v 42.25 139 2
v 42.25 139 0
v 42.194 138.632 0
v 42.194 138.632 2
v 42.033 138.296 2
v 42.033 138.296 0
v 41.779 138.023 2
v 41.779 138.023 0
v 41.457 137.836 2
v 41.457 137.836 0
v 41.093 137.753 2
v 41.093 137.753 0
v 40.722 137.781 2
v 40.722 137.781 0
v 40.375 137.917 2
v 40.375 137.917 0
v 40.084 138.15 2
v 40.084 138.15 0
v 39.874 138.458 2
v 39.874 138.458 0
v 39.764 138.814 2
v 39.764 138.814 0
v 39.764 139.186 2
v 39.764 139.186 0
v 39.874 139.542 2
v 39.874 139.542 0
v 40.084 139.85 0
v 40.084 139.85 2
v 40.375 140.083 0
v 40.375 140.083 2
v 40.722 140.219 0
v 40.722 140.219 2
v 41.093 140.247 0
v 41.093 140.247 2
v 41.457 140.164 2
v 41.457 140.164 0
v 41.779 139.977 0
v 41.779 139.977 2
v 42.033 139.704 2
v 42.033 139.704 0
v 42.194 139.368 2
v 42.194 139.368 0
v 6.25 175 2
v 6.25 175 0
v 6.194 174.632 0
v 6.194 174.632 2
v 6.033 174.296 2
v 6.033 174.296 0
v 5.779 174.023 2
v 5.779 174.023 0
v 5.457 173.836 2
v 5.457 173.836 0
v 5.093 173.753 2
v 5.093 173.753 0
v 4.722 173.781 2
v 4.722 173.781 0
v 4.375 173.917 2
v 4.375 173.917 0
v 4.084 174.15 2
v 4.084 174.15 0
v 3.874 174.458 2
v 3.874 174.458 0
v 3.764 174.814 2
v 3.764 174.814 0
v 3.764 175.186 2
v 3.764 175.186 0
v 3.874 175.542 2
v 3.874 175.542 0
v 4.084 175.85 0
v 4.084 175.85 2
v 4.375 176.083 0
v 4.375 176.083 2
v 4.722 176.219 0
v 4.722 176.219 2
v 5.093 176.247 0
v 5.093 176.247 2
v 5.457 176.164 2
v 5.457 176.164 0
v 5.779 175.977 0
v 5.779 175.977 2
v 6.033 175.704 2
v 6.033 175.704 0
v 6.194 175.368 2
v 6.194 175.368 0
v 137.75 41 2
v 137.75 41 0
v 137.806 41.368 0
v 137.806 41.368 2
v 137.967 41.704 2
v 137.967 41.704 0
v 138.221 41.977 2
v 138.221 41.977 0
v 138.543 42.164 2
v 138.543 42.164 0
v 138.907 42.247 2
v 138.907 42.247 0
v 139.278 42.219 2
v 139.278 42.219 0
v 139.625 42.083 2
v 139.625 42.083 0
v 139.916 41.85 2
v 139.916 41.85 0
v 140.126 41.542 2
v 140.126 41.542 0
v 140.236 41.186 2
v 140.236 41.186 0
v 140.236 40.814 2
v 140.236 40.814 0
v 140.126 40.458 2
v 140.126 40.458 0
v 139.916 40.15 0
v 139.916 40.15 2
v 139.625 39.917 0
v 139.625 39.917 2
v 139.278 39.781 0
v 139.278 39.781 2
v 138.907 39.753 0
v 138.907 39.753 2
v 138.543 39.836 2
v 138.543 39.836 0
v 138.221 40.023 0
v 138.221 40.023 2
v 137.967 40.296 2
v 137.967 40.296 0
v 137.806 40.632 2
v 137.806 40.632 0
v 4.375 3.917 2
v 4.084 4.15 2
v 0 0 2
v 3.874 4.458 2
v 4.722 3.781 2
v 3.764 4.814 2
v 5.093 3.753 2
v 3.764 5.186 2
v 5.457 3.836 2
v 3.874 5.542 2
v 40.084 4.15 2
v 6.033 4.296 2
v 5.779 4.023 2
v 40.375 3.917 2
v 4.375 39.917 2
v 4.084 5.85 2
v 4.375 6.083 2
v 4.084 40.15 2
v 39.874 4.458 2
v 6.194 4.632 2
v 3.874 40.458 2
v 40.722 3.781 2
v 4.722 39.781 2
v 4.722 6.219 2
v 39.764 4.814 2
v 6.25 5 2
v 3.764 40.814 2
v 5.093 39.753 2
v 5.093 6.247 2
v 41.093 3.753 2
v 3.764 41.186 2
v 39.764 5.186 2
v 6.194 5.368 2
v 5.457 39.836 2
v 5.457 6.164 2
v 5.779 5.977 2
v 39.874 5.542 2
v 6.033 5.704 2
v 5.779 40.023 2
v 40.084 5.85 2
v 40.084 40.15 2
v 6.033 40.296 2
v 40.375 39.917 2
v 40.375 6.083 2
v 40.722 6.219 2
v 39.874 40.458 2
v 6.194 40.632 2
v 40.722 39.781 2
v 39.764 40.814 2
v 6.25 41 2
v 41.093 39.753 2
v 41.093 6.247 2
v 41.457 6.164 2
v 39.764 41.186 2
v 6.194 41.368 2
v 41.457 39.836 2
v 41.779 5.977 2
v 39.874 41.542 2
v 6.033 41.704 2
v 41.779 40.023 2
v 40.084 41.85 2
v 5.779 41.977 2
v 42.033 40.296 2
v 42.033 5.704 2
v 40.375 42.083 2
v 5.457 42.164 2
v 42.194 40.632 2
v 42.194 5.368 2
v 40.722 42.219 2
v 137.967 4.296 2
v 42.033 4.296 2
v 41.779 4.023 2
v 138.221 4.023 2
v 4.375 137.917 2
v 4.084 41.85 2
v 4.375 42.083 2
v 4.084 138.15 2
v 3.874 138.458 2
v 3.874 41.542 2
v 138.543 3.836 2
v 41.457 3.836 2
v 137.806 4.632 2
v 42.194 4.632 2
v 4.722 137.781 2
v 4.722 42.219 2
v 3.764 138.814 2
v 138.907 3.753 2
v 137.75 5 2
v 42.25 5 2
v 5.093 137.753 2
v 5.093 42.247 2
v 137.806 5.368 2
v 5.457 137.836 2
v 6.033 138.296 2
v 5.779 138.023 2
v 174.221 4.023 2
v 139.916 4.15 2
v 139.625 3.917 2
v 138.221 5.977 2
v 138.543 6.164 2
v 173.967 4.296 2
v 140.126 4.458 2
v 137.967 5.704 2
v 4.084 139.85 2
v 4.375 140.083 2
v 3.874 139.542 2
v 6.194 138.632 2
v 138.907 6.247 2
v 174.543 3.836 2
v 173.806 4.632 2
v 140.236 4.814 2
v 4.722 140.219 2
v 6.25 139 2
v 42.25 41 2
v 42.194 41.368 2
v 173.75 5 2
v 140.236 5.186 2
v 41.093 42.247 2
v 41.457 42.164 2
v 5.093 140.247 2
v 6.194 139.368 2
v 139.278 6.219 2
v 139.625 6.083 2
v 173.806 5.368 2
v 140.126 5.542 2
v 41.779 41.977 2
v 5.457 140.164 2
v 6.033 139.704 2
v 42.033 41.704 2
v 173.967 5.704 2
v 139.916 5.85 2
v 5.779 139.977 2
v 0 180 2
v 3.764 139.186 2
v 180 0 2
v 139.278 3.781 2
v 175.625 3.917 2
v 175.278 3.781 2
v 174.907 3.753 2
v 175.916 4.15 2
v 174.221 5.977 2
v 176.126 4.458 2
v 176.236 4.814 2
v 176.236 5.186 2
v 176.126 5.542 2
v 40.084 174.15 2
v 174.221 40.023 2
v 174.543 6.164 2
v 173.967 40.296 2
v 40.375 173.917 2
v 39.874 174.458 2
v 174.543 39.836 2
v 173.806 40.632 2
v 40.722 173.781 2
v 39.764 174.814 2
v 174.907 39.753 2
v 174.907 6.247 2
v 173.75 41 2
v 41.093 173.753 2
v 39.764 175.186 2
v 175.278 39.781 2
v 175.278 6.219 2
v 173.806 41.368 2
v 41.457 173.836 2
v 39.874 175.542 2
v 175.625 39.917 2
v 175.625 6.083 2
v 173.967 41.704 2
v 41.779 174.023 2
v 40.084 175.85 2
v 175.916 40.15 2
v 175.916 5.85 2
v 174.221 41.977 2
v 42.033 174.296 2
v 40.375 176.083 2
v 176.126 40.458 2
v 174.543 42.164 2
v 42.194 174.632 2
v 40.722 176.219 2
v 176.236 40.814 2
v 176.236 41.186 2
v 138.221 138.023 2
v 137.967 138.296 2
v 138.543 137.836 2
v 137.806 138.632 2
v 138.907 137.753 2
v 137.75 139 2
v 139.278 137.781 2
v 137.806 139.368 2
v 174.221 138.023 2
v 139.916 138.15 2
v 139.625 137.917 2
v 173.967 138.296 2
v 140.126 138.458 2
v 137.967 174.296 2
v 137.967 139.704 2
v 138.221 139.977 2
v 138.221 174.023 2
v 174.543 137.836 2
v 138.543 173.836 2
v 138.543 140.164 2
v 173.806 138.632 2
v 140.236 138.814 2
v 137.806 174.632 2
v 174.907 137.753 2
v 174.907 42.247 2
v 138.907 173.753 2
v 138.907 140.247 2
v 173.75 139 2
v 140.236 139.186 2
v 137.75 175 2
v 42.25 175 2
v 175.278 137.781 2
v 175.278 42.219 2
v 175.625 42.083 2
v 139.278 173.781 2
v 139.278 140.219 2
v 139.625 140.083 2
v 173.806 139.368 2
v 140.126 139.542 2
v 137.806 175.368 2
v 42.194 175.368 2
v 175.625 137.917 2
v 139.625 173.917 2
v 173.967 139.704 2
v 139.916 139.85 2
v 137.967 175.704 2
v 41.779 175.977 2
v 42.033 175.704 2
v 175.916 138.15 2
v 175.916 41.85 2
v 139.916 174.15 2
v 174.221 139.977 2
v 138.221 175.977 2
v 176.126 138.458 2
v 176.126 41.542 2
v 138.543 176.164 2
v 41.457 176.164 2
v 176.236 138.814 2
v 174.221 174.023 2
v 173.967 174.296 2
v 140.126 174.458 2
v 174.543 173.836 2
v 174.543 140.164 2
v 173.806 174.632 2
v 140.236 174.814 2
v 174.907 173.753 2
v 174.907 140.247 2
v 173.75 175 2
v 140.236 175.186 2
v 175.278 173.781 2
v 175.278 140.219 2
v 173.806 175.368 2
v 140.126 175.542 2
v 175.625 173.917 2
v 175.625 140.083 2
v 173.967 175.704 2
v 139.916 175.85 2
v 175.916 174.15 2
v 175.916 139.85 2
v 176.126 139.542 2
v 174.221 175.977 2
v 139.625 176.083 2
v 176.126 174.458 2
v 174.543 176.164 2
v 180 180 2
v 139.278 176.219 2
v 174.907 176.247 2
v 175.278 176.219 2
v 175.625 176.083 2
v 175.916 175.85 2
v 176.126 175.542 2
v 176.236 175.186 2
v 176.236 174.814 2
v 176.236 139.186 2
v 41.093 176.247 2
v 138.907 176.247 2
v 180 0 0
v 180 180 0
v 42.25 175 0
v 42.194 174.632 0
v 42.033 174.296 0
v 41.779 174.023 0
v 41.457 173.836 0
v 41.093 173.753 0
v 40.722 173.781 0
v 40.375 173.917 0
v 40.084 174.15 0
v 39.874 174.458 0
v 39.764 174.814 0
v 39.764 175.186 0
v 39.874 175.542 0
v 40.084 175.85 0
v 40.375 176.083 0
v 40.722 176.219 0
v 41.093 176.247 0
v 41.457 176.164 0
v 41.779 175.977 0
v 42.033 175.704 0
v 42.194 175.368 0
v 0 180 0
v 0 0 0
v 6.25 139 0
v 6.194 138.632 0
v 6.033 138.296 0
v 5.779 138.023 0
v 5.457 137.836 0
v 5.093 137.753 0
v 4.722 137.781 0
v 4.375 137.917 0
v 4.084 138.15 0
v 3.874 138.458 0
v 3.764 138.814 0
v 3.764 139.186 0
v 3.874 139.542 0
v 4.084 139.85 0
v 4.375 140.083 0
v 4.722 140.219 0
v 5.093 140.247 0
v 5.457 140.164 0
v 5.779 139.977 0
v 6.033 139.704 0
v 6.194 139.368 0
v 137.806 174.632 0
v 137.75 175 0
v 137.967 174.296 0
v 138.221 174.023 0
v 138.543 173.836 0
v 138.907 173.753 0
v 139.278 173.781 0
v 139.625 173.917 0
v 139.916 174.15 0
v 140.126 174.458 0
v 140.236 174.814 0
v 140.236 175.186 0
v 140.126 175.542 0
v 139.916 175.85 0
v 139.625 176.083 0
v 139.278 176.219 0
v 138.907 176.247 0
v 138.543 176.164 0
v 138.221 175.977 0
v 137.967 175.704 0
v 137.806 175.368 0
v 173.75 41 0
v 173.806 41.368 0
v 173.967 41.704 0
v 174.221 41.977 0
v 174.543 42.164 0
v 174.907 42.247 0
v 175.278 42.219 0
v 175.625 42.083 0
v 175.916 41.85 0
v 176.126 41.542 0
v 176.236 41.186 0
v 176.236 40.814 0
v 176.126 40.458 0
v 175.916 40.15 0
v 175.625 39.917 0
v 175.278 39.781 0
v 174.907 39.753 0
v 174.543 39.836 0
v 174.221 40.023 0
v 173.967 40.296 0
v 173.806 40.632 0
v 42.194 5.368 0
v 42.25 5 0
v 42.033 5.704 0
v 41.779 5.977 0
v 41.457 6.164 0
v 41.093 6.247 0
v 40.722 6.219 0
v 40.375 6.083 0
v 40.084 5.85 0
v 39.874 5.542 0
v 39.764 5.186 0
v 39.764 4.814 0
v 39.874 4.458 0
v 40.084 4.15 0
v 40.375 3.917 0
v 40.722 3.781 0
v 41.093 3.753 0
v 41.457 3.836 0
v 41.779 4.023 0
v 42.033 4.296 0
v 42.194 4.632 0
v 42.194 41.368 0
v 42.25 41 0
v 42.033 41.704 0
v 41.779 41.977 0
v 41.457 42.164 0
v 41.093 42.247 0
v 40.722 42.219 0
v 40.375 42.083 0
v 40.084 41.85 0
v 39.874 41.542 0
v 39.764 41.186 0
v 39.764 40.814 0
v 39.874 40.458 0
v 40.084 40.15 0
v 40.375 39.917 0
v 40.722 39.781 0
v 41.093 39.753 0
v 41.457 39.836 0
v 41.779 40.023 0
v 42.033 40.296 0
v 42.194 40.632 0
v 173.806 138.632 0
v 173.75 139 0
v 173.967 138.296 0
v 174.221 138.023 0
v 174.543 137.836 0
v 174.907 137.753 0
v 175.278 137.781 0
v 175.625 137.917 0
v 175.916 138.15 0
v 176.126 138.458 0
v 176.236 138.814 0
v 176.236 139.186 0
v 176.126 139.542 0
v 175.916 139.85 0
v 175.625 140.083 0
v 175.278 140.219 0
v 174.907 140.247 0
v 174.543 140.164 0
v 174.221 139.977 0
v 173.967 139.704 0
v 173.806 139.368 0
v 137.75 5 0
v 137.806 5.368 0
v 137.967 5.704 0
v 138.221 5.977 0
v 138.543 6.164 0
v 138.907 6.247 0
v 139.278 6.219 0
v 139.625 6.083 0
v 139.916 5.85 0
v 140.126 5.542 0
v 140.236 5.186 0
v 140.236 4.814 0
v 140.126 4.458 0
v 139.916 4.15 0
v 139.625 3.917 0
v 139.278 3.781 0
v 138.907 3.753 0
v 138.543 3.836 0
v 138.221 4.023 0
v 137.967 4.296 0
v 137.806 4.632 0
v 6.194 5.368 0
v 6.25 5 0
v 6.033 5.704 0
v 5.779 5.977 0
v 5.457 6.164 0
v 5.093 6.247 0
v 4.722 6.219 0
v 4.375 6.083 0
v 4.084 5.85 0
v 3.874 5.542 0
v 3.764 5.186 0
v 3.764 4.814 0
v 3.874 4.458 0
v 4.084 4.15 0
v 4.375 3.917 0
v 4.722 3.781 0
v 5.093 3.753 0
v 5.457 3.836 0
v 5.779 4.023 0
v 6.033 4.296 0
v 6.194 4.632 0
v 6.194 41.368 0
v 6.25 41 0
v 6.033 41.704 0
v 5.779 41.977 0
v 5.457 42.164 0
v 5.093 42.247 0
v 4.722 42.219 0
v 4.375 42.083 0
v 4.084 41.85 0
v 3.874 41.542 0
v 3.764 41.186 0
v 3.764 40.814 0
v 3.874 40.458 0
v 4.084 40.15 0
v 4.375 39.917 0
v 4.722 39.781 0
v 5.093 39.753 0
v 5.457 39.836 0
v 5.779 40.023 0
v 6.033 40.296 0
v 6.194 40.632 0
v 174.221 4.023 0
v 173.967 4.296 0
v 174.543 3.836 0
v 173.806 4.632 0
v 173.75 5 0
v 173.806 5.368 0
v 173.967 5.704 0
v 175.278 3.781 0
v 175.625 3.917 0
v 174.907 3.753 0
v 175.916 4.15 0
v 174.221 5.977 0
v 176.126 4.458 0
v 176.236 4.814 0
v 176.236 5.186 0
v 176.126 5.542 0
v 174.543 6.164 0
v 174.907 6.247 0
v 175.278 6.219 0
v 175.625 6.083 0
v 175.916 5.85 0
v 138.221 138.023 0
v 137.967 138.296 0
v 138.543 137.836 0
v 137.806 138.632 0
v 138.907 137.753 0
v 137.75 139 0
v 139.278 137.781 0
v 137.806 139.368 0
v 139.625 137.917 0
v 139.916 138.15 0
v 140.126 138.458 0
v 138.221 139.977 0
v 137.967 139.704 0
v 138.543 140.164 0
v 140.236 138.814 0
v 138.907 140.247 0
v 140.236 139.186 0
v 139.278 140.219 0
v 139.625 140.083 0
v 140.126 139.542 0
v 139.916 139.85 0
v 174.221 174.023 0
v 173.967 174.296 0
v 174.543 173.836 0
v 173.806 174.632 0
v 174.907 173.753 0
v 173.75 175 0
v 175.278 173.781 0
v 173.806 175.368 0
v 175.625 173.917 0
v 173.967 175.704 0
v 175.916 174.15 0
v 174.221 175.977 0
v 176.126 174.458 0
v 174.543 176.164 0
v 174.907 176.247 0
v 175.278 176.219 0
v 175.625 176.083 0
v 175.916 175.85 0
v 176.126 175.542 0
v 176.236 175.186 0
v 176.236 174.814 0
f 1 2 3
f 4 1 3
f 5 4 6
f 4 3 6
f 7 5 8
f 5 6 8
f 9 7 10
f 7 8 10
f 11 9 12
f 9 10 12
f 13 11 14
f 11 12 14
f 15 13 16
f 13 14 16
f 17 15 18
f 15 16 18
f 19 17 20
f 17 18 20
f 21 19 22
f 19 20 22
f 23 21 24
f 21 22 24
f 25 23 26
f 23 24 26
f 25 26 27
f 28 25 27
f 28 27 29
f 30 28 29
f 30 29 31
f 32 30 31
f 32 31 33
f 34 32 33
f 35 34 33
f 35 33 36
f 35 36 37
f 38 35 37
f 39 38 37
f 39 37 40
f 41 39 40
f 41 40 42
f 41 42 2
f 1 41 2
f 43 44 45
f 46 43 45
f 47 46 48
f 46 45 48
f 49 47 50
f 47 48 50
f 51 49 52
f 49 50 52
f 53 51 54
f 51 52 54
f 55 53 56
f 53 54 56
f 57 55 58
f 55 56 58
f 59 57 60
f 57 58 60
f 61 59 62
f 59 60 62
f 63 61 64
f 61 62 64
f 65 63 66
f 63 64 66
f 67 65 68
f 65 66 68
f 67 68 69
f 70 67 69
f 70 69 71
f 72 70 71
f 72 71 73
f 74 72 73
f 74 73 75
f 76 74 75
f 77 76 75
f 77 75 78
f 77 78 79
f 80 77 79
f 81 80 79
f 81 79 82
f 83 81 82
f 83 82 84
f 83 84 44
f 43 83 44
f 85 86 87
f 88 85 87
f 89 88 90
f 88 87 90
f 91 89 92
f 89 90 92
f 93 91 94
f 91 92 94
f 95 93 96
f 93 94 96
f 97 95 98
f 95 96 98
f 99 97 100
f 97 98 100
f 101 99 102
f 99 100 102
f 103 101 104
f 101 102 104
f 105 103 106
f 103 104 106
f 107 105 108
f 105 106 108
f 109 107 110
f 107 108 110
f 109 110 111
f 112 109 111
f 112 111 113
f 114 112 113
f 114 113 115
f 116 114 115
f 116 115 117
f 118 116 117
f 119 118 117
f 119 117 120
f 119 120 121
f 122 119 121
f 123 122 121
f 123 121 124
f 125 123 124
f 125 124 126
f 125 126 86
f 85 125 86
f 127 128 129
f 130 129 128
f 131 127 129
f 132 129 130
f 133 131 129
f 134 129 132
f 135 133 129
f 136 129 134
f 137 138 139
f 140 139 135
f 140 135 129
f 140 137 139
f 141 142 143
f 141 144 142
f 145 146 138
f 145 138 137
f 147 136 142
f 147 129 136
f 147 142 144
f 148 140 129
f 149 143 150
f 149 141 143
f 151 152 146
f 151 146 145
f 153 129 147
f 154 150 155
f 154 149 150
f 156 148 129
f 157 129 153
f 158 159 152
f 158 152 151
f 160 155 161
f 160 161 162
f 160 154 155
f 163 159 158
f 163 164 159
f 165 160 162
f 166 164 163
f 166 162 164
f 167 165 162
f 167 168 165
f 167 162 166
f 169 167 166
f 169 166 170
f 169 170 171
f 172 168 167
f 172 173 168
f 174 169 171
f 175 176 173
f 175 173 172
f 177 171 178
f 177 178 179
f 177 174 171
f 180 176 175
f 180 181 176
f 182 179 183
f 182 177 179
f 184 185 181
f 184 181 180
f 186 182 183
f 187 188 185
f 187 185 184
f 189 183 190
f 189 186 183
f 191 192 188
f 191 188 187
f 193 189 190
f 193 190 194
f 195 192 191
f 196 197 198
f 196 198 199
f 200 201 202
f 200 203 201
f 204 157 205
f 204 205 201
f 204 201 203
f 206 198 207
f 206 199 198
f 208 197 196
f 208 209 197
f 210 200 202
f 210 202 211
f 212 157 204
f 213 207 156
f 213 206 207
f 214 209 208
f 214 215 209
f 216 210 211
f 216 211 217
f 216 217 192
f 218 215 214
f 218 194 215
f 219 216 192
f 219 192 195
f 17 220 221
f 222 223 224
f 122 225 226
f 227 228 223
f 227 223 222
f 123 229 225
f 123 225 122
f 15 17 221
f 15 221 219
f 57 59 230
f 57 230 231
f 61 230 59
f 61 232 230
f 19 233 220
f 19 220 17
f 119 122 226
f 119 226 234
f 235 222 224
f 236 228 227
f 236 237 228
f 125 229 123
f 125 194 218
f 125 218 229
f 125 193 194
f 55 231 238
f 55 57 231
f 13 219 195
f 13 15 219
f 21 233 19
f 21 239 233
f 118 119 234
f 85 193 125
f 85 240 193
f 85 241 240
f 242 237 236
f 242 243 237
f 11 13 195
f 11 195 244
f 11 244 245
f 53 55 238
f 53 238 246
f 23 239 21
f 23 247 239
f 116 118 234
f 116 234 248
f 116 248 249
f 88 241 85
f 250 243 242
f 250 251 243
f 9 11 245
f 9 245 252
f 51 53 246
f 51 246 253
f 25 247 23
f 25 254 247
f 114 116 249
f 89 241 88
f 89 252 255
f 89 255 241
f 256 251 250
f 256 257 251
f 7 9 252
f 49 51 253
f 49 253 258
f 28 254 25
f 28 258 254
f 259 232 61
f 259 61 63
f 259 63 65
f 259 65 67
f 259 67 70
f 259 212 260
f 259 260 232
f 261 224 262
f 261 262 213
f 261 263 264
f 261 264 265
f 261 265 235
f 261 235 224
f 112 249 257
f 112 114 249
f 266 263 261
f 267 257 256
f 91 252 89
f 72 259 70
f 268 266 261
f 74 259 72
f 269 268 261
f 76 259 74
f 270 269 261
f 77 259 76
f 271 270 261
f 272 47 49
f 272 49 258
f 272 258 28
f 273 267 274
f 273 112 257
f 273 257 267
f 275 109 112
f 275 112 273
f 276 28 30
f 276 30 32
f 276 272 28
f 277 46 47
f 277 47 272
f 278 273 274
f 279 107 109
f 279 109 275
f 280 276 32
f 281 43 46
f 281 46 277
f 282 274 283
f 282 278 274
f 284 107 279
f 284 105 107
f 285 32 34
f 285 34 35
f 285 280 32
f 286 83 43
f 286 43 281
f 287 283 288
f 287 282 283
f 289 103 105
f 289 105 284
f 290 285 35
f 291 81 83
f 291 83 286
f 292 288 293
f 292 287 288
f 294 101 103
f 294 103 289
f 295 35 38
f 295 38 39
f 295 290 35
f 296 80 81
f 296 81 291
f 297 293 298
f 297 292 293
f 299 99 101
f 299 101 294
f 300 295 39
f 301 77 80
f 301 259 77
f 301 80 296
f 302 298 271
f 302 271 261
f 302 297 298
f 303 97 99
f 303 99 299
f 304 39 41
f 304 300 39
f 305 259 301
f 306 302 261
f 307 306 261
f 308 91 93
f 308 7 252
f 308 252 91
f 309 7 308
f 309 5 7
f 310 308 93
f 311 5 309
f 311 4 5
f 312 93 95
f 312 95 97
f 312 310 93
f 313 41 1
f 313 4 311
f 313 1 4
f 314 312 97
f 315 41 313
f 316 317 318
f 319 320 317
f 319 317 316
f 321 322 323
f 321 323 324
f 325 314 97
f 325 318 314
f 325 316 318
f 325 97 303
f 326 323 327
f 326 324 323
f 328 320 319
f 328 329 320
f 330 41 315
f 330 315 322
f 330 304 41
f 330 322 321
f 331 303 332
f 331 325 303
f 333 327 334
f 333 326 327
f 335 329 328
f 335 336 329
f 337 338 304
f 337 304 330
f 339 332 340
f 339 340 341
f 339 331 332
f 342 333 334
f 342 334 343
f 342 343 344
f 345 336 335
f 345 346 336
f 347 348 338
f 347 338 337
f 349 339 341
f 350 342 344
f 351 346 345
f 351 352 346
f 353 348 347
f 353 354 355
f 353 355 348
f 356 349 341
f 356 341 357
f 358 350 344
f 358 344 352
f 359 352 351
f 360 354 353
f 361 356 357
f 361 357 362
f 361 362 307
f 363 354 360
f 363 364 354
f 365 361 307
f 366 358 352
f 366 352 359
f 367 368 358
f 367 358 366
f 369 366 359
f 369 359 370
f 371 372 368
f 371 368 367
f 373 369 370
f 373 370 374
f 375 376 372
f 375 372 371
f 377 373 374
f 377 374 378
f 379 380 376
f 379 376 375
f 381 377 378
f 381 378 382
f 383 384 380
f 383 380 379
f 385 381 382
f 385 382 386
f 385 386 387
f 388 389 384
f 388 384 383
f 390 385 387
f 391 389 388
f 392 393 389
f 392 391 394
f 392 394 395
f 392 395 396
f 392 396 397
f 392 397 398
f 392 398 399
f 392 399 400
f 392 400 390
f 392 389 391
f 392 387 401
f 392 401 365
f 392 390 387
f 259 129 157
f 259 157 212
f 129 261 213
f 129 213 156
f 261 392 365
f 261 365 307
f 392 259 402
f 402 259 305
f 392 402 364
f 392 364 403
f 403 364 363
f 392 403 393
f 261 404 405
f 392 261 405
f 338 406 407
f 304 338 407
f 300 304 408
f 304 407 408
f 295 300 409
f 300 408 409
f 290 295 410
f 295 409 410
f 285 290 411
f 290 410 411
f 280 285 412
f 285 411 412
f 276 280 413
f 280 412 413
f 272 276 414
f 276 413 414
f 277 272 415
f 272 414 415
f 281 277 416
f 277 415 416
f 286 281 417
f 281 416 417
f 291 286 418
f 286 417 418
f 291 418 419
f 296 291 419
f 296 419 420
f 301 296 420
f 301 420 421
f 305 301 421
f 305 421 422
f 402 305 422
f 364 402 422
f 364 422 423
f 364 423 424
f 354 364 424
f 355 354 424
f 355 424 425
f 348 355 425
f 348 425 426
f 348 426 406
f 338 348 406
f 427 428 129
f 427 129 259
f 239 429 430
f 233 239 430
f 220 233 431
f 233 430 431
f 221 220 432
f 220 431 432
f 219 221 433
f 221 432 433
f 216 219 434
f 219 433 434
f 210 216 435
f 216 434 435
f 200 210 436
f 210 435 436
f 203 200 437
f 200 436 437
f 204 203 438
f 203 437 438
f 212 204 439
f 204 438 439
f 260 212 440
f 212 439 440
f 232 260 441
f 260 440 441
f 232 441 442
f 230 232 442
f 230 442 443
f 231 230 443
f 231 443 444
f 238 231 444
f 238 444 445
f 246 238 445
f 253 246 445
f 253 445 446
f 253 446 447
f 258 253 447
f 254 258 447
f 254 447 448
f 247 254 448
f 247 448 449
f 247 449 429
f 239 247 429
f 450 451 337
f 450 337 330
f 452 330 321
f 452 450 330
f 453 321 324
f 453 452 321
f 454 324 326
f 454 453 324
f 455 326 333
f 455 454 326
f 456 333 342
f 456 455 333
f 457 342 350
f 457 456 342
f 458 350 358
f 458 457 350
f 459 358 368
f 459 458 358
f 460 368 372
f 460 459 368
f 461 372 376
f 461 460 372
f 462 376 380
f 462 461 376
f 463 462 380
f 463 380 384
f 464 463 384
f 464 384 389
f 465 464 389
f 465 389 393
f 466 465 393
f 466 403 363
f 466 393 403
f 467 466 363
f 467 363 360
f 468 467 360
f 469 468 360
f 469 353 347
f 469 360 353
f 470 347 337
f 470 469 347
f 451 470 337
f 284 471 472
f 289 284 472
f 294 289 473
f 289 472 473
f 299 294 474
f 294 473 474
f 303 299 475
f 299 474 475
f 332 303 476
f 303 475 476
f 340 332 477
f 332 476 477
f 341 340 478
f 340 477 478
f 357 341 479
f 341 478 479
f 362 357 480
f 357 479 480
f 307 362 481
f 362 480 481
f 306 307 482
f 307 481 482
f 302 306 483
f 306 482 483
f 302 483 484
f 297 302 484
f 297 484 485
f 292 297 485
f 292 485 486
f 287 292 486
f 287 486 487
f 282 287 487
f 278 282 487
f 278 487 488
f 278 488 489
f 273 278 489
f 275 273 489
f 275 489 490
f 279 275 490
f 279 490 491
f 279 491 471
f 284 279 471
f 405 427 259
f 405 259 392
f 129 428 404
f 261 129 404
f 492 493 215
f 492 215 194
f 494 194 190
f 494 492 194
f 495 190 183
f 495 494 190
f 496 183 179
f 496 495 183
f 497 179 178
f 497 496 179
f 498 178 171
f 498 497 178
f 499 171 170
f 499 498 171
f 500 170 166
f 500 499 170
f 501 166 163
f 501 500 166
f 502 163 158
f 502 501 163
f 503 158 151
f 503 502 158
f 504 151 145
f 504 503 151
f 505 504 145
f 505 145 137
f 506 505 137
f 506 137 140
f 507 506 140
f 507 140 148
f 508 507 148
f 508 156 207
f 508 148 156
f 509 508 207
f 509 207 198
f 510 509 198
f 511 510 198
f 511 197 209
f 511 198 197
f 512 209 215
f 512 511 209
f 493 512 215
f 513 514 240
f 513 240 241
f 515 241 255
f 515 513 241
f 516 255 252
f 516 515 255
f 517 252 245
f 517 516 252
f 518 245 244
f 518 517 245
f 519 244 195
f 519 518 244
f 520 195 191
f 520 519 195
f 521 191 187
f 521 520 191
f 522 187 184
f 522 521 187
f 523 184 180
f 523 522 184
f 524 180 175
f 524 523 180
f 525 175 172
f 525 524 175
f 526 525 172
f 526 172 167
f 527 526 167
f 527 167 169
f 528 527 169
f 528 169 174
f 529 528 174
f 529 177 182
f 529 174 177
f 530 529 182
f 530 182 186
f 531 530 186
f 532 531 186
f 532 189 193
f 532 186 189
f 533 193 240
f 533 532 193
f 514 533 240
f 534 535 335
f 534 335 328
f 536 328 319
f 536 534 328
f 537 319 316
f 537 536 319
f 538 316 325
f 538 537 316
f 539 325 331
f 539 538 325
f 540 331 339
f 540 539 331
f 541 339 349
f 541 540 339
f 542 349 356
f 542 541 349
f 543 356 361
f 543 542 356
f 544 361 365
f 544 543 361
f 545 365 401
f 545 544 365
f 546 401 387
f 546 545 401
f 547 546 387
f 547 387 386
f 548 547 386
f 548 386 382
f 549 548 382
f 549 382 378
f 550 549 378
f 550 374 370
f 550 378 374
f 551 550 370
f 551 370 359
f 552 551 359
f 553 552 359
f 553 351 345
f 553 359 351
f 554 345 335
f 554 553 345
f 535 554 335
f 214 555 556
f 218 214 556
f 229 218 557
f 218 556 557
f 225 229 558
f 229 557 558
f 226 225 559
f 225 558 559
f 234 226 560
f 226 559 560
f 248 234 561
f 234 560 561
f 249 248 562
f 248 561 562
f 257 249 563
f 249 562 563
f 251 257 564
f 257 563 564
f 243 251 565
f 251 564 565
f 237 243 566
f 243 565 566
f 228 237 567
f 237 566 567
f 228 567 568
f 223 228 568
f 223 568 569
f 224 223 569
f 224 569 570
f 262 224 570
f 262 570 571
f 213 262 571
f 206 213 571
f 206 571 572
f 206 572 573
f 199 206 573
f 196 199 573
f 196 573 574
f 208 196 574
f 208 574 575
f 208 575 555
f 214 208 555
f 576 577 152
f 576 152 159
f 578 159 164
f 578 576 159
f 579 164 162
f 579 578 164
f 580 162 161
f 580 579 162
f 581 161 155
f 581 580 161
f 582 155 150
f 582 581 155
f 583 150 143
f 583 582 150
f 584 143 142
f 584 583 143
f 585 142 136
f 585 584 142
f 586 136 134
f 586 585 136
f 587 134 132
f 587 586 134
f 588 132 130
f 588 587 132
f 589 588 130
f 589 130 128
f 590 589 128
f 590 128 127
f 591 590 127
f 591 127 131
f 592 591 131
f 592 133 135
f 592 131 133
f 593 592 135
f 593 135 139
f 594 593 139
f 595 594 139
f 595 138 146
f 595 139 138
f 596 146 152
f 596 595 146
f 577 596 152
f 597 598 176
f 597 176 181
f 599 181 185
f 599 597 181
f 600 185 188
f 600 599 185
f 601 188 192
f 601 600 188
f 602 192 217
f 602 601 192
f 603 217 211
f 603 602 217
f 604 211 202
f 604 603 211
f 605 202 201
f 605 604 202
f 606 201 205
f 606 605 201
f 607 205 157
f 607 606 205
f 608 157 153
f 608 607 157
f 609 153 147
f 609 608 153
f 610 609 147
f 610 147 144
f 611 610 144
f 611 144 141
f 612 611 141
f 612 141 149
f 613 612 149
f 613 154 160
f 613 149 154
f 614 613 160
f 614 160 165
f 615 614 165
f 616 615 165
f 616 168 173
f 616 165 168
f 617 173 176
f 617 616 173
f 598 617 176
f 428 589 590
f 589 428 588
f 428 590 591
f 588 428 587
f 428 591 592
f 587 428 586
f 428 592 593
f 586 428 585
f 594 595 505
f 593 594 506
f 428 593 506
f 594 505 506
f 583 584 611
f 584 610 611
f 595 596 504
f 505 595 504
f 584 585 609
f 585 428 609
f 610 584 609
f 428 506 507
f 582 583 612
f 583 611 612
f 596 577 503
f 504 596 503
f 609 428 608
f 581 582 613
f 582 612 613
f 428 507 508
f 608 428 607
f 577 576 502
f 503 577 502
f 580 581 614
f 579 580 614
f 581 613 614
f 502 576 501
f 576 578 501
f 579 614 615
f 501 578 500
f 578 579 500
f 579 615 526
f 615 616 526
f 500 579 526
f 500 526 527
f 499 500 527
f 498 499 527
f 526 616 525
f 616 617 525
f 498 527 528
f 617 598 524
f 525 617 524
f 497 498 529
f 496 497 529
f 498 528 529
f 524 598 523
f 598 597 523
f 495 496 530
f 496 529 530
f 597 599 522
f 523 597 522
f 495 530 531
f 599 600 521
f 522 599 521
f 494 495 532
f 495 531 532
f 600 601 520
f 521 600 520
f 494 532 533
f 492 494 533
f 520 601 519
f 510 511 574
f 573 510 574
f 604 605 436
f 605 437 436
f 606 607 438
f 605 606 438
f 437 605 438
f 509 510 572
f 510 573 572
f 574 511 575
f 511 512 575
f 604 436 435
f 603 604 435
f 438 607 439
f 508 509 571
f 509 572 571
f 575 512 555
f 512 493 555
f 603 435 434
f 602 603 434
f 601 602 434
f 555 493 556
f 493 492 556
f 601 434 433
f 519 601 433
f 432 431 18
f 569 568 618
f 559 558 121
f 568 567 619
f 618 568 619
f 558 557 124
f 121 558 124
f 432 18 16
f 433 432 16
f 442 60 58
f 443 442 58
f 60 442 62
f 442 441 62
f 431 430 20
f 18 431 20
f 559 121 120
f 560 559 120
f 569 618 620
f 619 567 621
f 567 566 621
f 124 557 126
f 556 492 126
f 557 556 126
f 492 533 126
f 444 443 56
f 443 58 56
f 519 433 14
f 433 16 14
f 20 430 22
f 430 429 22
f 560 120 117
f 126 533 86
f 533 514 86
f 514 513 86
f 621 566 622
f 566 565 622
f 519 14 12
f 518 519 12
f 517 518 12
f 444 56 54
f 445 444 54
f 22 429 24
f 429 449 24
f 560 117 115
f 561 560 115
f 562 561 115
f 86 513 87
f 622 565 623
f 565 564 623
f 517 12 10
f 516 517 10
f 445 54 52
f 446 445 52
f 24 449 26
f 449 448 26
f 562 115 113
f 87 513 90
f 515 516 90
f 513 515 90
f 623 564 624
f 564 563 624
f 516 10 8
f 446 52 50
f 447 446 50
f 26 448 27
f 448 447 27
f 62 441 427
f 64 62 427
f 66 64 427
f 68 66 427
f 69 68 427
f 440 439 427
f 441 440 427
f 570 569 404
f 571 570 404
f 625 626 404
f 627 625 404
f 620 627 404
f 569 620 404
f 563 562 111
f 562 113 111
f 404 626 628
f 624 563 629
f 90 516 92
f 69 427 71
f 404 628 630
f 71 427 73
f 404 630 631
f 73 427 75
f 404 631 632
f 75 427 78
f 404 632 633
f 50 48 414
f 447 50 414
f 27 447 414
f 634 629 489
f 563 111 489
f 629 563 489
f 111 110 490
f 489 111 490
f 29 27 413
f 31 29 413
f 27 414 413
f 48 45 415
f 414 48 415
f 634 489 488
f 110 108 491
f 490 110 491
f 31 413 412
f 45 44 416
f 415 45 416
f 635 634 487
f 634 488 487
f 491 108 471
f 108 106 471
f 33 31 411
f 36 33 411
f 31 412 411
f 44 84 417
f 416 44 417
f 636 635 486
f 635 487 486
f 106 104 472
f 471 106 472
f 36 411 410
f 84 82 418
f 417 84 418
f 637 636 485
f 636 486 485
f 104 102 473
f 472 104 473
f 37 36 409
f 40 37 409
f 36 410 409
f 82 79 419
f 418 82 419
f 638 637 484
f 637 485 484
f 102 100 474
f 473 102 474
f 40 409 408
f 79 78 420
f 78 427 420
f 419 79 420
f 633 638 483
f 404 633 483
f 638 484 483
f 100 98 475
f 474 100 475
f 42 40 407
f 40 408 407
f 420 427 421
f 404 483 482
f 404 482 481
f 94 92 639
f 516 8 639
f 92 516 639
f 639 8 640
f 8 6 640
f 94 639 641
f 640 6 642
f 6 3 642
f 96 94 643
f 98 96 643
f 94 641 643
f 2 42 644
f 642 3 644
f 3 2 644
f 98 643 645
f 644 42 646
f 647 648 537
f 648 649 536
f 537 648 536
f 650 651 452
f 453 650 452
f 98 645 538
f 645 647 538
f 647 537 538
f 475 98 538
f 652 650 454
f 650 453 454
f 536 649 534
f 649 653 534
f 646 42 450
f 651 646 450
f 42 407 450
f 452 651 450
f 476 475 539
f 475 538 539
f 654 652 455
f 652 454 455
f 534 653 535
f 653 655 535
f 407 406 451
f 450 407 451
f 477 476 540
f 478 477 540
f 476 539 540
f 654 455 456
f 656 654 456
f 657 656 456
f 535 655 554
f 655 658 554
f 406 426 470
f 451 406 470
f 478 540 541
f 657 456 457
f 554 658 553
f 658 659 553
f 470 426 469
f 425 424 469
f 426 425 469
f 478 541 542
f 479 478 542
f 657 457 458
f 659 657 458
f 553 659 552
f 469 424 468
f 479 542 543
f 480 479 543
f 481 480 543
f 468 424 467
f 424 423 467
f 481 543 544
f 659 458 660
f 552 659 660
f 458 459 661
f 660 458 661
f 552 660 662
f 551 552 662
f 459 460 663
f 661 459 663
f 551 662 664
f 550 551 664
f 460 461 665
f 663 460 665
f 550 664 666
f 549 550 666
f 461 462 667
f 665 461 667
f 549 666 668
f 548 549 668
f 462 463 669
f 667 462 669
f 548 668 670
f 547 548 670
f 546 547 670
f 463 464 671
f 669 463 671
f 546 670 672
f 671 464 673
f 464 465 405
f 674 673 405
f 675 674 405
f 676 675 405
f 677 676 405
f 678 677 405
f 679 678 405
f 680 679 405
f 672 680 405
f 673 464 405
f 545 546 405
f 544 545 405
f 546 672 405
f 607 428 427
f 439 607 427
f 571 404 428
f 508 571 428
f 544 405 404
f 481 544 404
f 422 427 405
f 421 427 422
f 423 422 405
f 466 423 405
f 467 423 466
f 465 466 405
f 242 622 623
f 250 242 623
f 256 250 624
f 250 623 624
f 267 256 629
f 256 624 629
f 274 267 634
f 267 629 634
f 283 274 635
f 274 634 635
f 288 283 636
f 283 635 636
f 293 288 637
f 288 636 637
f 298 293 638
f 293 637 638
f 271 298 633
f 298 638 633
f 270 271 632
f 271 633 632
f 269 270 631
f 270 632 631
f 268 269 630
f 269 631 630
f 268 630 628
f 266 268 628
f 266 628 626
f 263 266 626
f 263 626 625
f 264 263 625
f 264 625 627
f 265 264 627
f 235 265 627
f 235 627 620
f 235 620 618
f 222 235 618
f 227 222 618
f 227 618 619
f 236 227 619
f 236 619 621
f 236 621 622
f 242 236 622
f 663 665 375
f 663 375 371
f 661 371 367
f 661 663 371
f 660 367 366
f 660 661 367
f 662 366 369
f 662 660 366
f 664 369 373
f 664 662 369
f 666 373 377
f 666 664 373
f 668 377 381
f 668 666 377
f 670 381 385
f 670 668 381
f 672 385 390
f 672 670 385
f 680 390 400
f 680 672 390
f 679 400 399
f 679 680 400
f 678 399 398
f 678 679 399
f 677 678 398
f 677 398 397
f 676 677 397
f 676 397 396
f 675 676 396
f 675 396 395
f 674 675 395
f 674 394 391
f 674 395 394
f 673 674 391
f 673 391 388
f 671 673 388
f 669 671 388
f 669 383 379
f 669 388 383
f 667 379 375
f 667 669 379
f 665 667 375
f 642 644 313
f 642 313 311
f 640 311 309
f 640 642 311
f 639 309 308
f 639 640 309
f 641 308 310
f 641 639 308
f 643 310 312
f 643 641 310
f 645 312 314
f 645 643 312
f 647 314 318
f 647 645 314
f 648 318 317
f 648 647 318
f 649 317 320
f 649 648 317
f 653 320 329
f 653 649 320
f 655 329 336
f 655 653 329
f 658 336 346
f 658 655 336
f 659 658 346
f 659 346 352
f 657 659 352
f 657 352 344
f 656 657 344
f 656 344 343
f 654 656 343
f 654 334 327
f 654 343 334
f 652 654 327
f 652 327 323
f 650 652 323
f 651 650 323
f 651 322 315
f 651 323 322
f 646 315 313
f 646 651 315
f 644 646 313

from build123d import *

# Parameters (mm, degrees)
SKETCH_1_W        = 180
SKETCH_1_H        = 180
EXTRUDE_1_DEPTH   = 2
M3X0_5_1_D        = 2.5
MIRROR_2_COPY_1_D = 2.5


with BuildPart() as part:
    # ｽｹｯﾁ1 → ﾎﾞｽ - 押し出し1 (new body)
    with BuildSketch(Plane.XY):
        with Locations((90, 90)):
            Rectangle(SKETCH_1_W, SKETCH_1_H)
    extrude(amount=EXTRUDE_1_DEPTH)

    # M3x0.5 ねじ穴1 (through all)
    with Locations(Plane.XY.offset(2)):
        with Locations((175, 5), (175, 41), (139, 41), (139, 5)):
            m3x0_5_1 = Hole(M3X0_5_1_D / 2)

    # ﾐﾗｰ1: M3x0.5 ねじ穴1 across plane
    add(m3x0_5_1.mirror(Plane.ZX.offset(90)), mode=Mode.SUBTRACT)

    # ﾐﾗｰ2: M3x0.5 ねじ穴1 across plane
    add(m3x0_5_1.mirror(Plane(origin=(90, 0, 0), x_dir=(0, 0, 1), z_dir=(1, 0, 0))), mode=Mode.SUBTRACT)

    # ﾐﾗｰ2 copy 1 (through all)
    with Locations(Plane(origin=(180, 180, 2), x_dir=(-1, 0, 0), z_dir=(0, 0, 1))):
        with Locations((175, 5), (175, 41), (139, 41), (139, 5)):
            Hole(MIRROR_2_COPY_1_D / 2)


solid = part.part
